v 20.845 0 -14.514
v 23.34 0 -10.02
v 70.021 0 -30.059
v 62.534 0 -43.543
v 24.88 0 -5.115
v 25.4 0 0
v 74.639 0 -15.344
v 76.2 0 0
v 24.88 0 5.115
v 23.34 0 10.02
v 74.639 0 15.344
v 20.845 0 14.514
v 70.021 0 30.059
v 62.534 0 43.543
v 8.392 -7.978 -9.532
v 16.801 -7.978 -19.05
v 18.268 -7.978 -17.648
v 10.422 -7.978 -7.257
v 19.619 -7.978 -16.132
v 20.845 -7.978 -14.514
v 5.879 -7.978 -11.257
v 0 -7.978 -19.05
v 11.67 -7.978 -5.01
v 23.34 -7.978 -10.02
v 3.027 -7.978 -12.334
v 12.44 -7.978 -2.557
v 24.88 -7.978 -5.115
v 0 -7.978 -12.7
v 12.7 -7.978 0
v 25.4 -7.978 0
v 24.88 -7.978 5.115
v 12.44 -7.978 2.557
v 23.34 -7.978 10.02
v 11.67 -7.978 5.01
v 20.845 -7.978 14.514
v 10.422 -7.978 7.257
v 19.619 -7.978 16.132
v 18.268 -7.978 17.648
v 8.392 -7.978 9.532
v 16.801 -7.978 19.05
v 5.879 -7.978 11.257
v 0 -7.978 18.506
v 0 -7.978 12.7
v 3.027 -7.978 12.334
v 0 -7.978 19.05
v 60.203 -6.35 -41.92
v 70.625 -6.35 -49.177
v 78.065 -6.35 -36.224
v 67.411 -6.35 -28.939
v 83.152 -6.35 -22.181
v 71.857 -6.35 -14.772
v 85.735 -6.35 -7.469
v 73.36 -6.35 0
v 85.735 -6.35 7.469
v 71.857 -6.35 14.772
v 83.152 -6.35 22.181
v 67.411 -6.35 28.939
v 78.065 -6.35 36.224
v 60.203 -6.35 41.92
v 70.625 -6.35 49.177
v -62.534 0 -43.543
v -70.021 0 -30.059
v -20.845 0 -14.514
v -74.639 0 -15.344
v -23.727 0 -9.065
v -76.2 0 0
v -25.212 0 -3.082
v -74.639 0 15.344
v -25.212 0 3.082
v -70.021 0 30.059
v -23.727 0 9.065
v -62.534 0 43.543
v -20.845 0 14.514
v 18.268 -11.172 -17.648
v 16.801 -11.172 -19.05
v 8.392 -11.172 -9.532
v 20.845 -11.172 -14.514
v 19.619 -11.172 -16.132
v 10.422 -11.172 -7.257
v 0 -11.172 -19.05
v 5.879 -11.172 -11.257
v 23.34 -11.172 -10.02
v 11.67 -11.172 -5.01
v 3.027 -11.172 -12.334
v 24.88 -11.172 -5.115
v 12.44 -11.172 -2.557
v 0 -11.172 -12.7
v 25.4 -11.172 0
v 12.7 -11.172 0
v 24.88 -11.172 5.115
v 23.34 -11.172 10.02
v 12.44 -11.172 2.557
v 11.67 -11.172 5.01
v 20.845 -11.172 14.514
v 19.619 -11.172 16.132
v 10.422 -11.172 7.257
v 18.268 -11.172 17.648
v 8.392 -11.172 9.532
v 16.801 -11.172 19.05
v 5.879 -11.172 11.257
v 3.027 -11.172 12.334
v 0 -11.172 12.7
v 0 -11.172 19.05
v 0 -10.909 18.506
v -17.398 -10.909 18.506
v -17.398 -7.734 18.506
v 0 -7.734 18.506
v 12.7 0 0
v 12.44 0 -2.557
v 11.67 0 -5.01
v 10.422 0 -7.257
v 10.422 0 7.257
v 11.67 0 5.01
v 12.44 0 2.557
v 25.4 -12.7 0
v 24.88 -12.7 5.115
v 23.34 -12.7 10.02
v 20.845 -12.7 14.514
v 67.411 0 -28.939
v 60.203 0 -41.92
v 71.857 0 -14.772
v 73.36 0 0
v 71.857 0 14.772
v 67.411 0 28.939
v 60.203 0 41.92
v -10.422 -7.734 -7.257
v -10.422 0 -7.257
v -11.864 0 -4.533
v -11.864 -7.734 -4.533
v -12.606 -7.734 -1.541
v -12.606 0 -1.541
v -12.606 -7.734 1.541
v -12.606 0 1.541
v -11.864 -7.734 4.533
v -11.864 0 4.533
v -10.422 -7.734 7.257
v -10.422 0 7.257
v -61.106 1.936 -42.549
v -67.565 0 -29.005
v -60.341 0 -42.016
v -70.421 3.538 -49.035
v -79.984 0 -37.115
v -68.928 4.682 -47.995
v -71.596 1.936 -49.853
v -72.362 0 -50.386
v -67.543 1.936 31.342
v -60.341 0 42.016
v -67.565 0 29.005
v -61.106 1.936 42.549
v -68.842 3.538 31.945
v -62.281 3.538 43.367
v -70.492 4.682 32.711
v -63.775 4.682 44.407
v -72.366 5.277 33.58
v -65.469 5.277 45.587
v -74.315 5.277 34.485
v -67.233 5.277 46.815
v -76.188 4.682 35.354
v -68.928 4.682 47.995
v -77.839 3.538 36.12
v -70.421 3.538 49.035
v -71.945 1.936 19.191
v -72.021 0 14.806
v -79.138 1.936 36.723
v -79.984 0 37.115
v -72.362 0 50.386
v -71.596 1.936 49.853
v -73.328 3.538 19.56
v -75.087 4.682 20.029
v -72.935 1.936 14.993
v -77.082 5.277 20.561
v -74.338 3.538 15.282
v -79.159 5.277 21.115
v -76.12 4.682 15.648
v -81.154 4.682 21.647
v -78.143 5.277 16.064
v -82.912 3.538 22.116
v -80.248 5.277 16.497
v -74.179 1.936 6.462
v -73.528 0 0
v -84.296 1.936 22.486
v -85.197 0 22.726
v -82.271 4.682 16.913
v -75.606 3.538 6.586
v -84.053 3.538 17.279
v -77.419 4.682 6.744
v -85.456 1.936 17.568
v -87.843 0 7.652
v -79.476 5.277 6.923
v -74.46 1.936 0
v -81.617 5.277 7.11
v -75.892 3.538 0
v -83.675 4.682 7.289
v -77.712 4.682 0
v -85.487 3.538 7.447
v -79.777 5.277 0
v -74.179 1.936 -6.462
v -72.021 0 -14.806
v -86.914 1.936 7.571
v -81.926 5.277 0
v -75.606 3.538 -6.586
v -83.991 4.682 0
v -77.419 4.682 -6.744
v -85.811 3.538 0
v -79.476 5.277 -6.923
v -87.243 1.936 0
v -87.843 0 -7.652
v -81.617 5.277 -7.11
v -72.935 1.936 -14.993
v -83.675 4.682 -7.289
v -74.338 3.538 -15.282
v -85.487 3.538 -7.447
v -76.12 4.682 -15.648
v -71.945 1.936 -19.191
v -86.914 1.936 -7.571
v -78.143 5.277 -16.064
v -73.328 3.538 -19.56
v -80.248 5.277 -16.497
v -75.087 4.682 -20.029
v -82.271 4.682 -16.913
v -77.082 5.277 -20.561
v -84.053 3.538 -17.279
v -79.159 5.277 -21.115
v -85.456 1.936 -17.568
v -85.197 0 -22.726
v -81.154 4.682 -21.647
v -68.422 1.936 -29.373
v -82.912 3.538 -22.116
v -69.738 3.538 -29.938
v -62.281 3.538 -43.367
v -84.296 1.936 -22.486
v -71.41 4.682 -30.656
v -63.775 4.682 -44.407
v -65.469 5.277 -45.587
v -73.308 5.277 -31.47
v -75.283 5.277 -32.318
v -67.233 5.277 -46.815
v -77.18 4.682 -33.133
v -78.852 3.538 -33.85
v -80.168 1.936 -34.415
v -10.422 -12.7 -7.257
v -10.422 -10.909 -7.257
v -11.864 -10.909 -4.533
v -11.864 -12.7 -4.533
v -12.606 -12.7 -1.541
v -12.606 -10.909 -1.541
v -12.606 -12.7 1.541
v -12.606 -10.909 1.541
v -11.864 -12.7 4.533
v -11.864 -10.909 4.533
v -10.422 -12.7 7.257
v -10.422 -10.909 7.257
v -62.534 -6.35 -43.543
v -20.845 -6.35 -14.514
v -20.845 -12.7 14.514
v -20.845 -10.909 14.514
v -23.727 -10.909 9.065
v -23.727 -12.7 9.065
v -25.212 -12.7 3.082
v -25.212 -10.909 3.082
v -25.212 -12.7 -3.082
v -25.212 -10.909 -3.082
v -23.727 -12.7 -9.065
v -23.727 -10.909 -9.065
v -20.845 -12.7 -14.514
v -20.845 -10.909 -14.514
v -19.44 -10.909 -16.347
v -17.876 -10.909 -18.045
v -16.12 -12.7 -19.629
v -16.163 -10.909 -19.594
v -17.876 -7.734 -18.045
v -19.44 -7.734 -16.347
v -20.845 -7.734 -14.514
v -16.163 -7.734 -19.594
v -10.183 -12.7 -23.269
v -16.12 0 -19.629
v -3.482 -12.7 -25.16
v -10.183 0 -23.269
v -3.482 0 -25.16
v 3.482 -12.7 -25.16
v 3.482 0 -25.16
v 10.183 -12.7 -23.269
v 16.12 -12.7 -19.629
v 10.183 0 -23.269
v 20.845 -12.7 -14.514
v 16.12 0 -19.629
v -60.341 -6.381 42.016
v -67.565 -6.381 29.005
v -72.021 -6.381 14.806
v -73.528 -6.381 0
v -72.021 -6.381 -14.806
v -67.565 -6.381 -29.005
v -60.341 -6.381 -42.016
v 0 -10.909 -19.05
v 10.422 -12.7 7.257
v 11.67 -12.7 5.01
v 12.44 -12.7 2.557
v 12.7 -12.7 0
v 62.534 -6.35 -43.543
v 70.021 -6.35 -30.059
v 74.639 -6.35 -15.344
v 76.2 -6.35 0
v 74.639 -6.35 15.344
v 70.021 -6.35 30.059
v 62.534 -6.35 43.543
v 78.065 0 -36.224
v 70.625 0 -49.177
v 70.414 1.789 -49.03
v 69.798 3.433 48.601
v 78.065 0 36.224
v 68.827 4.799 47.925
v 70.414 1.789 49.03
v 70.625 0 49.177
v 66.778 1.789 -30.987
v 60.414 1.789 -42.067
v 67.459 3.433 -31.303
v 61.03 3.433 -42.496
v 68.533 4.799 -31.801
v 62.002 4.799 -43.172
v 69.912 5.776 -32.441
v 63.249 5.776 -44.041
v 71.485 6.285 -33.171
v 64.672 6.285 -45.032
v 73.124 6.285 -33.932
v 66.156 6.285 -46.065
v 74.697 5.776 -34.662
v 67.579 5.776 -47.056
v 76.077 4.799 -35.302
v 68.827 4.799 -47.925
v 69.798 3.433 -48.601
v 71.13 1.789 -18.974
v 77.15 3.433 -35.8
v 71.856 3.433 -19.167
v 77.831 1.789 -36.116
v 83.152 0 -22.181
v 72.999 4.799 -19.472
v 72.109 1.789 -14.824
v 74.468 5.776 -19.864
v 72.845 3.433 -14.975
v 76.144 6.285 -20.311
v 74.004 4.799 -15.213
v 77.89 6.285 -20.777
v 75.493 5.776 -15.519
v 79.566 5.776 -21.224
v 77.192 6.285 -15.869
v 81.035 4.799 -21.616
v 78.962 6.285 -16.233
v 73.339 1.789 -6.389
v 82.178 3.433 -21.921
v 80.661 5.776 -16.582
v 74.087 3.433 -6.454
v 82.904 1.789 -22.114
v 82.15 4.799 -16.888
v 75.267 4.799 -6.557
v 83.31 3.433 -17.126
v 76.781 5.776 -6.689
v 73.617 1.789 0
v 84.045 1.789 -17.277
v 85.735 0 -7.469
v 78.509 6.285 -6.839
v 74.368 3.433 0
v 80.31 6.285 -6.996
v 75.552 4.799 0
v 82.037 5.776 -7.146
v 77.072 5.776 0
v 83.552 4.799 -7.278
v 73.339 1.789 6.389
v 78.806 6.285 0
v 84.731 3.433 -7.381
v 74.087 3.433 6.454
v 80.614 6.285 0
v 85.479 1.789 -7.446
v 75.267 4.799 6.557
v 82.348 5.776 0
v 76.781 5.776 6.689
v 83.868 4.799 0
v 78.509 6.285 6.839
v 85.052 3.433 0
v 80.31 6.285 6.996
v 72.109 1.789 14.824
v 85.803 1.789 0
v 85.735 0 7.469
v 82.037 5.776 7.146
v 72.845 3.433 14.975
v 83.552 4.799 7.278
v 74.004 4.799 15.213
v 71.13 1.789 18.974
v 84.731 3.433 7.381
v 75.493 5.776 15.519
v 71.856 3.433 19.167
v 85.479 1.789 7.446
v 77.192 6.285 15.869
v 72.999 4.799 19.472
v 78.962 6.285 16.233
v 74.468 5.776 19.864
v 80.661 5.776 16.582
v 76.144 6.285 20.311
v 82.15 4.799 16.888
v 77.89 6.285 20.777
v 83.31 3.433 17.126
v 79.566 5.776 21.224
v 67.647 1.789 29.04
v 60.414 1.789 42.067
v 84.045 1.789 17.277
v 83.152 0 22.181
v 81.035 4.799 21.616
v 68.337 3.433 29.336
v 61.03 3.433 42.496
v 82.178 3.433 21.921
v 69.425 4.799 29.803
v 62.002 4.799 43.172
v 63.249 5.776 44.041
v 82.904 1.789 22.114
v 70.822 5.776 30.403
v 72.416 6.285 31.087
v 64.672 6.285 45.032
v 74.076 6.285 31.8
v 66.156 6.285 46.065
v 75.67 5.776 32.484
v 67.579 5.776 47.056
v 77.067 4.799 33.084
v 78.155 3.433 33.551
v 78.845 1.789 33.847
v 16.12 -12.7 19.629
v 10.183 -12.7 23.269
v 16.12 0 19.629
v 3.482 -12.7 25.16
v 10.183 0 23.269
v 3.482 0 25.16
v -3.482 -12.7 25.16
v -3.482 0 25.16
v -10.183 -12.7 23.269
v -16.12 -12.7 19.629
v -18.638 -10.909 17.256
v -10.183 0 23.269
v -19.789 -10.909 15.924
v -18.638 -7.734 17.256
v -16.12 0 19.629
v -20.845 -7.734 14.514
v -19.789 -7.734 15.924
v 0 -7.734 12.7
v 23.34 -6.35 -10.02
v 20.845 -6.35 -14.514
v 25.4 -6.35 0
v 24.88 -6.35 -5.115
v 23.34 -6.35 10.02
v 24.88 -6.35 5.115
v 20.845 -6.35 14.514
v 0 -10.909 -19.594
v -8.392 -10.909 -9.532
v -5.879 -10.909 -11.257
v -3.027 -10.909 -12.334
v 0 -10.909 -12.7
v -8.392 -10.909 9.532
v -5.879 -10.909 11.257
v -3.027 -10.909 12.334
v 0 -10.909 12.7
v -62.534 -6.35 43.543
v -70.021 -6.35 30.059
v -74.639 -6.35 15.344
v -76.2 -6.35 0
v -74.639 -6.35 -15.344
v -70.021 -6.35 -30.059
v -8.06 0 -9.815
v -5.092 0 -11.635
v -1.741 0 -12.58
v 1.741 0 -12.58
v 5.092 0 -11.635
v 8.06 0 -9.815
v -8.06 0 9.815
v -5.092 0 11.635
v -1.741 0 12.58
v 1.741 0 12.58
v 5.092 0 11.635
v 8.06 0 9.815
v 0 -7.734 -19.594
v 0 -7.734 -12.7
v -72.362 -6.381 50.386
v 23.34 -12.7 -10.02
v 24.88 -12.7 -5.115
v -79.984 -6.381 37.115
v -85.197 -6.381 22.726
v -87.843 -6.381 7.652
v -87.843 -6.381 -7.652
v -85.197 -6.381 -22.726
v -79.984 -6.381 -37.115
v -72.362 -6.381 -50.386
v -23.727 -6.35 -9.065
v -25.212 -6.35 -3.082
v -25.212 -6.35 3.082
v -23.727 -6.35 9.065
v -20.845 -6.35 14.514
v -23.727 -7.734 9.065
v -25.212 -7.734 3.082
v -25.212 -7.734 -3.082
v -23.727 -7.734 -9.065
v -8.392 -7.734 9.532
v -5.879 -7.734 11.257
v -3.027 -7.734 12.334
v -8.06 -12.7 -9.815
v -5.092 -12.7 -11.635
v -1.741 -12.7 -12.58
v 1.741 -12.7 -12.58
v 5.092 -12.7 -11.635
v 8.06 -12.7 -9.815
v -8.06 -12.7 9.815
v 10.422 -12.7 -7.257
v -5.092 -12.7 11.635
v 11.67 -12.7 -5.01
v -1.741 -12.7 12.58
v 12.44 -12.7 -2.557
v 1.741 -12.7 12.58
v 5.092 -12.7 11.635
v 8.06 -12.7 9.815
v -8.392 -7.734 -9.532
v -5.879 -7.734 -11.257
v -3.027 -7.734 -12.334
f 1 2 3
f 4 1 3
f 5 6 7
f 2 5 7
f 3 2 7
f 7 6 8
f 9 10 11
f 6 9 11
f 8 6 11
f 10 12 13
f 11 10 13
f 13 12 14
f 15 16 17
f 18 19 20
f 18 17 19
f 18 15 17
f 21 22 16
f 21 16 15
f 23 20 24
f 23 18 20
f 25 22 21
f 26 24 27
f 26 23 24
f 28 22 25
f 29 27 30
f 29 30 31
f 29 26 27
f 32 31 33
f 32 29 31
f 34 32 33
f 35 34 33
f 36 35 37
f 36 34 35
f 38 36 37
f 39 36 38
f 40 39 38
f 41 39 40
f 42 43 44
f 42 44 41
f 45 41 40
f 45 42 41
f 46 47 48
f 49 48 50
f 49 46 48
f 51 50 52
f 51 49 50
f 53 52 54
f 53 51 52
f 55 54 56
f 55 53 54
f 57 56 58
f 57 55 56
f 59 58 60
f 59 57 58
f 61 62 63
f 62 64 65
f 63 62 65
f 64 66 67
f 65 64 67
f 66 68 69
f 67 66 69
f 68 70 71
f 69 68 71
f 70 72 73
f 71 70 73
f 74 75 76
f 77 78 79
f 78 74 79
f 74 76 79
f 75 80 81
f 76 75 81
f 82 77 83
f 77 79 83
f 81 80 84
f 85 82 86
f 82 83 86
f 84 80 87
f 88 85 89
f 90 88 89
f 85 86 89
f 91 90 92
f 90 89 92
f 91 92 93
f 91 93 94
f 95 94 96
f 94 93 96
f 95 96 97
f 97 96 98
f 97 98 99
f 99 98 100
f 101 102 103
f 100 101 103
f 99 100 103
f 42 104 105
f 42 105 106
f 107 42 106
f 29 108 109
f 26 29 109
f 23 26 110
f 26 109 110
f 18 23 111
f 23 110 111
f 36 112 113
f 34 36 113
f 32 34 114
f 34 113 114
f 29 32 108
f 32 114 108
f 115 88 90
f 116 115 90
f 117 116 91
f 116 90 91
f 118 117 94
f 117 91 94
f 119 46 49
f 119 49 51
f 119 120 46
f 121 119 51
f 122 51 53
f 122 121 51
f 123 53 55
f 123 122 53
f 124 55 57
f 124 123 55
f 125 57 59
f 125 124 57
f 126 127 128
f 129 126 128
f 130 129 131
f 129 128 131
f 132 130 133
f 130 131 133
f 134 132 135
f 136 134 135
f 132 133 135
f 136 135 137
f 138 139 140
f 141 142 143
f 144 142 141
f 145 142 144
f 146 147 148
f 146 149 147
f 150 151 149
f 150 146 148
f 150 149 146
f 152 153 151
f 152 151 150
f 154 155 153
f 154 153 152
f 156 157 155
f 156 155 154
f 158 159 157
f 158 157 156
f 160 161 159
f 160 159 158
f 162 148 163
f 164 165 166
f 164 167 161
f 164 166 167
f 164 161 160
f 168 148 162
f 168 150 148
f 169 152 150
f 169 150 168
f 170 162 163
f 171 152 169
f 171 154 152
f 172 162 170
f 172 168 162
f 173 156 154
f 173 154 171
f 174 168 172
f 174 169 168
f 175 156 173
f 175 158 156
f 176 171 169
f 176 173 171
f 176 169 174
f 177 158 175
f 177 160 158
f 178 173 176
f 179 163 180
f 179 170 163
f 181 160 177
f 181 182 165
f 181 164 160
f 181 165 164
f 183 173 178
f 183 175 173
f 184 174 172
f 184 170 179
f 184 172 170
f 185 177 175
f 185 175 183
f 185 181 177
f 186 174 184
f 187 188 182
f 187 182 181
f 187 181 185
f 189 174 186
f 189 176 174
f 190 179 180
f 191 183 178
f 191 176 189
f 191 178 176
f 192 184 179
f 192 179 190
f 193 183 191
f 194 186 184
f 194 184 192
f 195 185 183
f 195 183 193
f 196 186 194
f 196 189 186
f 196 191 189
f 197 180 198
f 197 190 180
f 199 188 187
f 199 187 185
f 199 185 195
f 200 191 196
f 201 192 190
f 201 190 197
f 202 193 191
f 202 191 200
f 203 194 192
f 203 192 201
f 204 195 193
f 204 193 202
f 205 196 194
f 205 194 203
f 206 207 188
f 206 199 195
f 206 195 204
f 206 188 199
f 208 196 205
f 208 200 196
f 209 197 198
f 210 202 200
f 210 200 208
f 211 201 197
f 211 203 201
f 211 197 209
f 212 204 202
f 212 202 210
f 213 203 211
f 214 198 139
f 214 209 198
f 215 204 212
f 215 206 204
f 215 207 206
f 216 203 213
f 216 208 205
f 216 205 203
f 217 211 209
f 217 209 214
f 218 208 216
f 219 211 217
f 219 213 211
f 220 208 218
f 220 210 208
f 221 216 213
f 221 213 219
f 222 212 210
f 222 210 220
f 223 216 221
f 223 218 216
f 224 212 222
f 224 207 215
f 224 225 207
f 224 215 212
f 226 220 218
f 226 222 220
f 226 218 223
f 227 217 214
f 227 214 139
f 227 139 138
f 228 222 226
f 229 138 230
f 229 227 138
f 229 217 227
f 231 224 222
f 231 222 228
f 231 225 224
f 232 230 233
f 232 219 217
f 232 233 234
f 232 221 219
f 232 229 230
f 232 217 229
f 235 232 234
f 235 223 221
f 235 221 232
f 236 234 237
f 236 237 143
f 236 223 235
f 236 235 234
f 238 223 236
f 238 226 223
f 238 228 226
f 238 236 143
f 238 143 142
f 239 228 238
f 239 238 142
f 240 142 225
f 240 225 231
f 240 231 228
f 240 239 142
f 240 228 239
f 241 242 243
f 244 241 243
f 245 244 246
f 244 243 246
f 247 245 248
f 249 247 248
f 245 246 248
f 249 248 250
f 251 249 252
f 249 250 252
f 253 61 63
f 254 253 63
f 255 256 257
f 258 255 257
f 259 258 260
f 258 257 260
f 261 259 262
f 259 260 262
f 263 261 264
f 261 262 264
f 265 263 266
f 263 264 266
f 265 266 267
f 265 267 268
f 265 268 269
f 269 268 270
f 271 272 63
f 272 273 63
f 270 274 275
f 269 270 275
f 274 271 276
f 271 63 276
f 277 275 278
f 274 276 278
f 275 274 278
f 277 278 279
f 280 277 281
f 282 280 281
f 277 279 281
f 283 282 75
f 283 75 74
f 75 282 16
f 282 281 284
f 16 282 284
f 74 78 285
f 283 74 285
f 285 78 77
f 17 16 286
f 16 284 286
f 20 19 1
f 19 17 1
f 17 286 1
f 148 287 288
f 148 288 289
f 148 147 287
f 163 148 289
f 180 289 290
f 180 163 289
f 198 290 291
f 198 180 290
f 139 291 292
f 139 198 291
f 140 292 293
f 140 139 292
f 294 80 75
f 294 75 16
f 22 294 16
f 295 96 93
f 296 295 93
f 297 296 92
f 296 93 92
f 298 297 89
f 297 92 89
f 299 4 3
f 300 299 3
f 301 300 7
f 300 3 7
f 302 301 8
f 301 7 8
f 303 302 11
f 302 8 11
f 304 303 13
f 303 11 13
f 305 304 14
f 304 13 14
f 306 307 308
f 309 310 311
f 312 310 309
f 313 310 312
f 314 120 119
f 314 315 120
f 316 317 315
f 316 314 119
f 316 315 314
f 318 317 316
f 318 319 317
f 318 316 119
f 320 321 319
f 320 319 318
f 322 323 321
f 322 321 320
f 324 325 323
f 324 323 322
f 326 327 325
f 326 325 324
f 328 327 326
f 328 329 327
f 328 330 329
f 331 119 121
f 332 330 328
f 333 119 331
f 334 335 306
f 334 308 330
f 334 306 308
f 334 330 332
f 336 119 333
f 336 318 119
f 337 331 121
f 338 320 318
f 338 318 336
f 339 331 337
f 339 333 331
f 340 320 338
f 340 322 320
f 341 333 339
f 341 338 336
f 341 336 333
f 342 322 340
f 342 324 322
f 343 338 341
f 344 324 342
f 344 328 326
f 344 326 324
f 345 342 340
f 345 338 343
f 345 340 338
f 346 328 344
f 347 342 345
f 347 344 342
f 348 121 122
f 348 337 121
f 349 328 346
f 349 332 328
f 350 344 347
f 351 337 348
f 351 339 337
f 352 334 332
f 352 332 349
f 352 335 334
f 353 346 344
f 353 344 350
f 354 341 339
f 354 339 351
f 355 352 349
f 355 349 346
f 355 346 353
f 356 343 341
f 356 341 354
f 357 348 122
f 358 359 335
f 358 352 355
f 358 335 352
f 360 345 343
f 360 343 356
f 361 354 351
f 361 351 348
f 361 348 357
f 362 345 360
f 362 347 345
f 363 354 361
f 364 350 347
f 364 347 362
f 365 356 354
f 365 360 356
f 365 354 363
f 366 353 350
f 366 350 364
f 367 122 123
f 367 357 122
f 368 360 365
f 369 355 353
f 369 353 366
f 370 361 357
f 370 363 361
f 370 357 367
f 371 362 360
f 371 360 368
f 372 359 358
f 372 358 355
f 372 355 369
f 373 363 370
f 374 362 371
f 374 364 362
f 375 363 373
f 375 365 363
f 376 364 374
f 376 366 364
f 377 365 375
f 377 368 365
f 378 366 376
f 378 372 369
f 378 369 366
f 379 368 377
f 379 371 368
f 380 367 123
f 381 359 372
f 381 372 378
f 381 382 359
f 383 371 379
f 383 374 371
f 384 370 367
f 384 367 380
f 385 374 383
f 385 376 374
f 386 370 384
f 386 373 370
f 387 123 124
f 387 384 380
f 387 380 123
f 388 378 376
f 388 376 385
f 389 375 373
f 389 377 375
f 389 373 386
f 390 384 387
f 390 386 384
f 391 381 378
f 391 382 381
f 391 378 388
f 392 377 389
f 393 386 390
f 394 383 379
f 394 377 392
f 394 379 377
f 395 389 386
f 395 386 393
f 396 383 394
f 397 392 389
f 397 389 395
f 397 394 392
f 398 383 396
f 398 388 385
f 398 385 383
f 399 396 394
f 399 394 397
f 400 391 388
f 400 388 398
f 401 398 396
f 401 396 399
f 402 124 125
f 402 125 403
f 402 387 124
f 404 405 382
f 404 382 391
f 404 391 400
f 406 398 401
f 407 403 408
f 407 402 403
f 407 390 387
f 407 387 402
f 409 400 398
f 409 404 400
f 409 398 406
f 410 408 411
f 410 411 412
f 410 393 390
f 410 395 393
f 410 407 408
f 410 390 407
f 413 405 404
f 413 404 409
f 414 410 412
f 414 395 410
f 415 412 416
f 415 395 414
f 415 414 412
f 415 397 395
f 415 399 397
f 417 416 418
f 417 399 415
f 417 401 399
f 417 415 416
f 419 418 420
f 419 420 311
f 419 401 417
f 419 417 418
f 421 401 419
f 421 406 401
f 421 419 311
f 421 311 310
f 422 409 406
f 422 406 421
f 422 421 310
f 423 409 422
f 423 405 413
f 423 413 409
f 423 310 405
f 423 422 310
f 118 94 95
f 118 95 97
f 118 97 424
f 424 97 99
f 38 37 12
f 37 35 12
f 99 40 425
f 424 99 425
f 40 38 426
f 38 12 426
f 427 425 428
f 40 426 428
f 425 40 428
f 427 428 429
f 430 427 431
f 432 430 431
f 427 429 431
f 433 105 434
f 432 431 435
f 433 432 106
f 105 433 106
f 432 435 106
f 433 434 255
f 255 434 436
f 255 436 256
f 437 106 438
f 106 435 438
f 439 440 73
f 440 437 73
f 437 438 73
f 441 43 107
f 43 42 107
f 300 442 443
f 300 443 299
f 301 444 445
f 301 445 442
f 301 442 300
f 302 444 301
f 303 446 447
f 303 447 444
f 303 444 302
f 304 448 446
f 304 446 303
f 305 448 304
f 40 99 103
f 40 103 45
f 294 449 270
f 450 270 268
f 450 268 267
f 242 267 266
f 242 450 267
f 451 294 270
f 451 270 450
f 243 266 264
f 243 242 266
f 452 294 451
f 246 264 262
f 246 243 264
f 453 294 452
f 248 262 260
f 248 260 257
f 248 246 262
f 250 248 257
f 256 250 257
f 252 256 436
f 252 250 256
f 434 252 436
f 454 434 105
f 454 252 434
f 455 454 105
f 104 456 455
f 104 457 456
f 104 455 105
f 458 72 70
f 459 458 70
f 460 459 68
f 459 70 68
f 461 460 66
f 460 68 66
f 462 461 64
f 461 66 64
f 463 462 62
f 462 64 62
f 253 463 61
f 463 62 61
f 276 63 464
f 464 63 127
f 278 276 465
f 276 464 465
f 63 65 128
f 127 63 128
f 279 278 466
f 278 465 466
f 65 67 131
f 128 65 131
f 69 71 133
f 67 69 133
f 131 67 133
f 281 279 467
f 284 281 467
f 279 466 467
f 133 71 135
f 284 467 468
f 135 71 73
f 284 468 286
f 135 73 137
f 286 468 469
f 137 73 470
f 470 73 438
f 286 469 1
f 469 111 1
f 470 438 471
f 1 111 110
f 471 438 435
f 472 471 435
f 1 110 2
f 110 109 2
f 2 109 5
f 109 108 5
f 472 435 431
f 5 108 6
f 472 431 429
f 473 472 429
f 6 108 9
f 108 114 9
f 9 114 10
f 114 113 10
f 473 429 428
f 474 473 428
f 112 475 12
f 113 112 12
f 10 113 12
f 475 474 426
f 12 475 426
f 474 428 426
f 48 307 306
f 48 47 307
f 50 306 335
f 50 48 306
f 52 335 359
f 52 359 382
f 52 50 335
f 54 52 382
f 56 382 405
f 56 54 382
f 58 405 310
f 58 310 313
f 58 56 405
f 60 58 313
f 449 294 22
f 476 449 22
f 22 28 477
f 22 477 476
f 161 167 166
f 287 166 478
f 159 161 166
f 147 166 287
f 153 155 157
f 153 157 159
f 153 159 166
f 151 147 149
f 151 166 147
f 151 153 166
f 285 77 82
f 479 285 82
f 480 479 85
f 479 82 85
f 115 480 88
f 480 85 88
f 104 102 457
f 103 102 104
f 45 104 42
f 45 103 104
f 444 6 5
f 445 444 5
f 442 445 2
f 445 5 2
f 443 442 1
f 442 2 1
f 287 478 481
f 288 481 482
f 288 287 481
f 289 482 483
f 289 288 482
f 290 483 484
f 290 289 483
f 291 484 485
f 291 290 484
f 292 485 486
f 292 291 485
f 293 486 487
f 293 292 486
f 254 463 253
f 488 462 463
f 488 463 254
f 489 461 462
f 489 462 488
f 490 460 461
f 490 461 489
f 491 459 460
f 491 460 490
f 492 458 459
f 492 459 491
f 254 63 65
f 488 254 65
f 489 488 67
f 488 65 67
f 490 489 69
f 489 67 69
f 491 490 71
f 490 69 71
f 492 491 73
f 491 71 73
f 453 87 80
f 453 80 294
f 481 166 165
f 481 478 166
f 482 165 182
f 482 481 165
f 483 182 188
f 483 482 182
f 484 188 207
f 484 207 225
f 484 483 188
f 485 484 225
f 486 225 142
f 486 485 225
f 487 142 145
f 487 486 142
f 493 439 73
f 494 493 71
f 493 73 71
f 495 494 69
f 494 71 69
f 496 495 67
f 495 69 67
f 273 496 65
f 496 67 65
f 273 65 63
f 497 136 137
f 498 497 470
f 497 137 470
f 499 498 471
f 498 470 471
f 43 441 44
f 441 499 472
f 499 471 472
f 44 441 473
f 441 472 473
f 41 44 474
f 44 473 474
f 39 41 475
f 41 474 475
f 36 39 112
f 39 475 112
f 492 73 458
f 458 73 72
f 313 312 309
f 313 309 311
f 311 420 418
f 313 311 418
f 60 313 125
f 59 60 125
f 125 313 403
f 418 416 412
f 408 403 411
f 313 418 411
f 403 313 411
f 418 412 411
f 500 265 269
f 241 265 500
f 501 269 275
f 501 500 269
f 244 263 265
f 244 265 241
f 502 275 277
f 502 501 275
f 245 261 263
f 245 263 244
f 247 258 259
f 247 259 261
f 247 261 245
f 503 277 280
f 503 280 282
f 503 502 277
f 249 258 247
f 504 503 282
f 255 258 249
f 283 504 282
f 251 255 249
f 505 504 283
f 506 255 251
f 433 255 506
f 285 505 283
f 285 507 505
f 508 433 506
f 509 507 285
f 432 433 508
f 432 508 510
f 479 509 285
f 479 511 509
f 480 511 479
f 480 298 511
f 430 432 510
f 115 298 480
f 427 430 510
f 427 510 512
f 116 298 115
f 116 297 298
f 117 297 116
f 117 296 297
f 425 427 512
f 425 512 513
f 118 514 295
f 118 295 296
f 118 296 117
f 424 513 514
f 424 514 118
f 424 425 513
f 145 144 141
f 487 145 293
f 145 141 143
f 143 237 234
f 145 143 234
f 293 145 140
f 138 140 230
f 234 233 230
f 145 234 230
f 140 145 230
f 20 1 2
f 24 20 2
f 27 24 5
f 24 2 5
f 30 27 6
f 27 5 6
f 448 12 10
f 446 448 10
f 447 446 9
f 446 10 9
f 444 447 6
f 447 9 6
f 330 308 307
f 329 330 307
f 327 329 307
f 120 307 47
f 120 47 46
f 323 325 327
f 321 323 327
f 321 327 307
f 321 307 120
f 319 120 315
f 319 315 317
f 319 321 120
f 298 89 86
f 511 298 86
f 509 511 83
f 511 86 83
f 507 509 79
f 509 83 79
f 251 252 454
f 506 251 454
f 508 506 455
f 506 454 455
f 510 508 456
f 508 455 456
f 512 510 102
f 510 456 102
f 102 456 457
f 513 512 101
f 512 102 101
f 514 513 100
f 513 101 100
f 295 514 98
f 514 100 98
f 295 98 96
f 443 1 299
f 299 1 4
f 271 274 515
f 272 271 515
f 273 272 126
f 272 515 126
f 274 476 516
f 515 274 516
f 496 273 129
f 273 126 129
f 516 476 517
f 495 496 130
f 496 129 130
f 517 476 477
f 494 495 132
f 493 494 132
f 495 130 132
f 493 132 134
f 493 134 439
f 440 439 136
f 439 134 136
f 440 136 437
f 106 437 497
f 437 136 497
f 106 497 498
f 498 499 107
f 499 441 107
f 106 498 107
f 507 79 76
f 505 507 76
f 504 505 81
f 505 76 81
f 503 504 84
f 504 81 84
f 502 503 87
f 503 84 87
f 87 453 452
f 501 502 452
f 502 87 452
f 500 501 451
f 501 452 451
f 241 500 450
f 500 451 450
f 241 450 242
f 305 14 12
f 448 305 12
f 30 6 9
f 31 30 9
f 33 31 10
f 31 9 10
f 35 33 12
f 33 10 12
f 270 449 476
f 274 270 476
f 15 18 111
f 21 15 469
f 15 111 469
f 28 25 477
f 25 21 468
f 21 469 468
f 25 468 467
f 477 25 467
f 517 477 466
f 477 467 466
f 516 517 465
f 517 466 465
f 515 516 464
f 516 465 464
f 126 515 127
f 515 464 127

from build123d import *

# Parameters (mm, degrees)
F1_DEPTH  = 6.35
F2_DEPTH  = 12.7
F7_W      = 12.7
F7_H      = 6.35
F9_W      = 3.1940120037
F9_H      = 38.1
F10_DEPTH = 38.1
F11_W     = 3.175
F11_H     = 38.1
F12_DEPTH = 38.1


with BuildPart() as f1:
    # F0 (on Front) → F1 (new body)
    with BuildSketch(Plane.XZ):
        with BuildLine():
            ThreePointArc((-20.8445558889, -14.5142857143), (-25.4, 0), (-20.8445558889, 14.5142857143))
            Line((-20.8445558889, 14.5142857143), (-62.5336676666, 43.5428571429))
            ThreePointArc((-62.5336676666, 43.5428571429), (-76.2, 0), (-62.5336676666, -43.5428571429))
            Line((-62.5336676666, -43.5428571429), (-20.8445558889, -14.5142857143))
        make_face()
    extrude(amount=F1_DEPTH)


with BuildPart() as f1b:
    # F0 (on Front) → F1, piece 2 (new body)
    with BuildSketch(Plane.XZ):
        with BuildLine():
            ThreePointArc((20.8445558889, 14.5142857143), (24.2343941494, 7.6061909134), (25.4, 0))
            ThreePointArc((25.4, 0), (24.2343941494, -7.6061909134), (20.8445558889, -14.5142857143))
            Line((20.8445558889, -14.5142857143), (62.5336676666, -43.5428571429))
            ThreePointArc((62.5336676666, -43.5428571429), (76.2, 0), (62.5336676666, 43.5428571429))
            Line((62.5336676666, 43.5428571429), (20.8445558889, 14.5142857143))
        make_face()
    extrude(amount=F1_DEPTH)


with BuildPart() as f2:
    # F0 (on Front) → F2 (new body)
    with BuildSketch(Plane.XZ):
        with BuildLine():
            Line((10.4222779444, 7.2571428571), (20.8445558889, 14.5142857143))
            ThreePointArc((20.8445558889, 14.5142857143), (0, 25.4), (-20.8445558889, 14.5142857143))
            Line((-20.8445558889, 14.5142857143), (-10.4222779444, 7.2571428571))
            ThreePointArc((-10.4222779444, 7.2571428571), (0, 12.7), (10.4222779444, 7.2571428571))
        make_face()
        with BuildLine():
            Line((-10.4222779444, 7.2571428571), (-20.8445558889, 14.5142857143))
            ThreePointArc((-20.8445558889, 14.5142857143), (-25.4, 0), (-20.8445558889, -14.5142857143))
            Line((-20.8445558889, -14.5142857143), (-10.4222779444, -7.2571428571))
            ThreePointArc((-10.4222779444, -7.2571428571), (-12.7, 0), (-10.4222779444, 7.2571428571))
        make_face()
        with BuildLine():
            ThreePointArc((-20.8445558889, -14.5142857143), (0, -25.4), (20.8445558889, -14.5142857143))
            Line((20.8445558889, -14.5142857143), (10.4222779444, -7.2571428571))
            ThreePointArc((10.4222779444, -7.2571428571), (0, -12.7), (-10.4222779444, -7.2571428571))
            Line((-10.4222779444, -7.2571428571), (-20.8445558889, -14.5142857143))
        make_face()
        with BuildLine():
            ThreePointArc((20.8445558889, -14.5142857143), (24.2343941494, -7.6061909134), (25.4, 0))
            ThreePointArc((25.4, 0), (24.2343941494, 7.6061909134), (20.8445558889, 14.5142857143))
            Line((20.8445558889, 14.5142857143), (10.4222779444, 7.2571428571))
            ThreePointArc((10.4222779444, 7.2571428571), (12.1171970747, 3.8030954567), (12.7, 0))
            ThreePointArc((12.7, 0), (12.1171970747, -3.8030954567), (10.4222779444, -7.2571428571))
            Line((10.4222779444, -7.2571428571), (20.8445558889, -14.5142857143))
        make_face()
    extrude(amount=F2_DEPTH)

    # F9 (on Right) → F10 (cut)
    with BuildSketch(Plane.YZ):
        with Locations((-9.5754200593, 0)):
            Rectangle(F9_W, F9_H)
    extrude(amount=F10_DEPTH, mode=Mode.SUBTRACT)

    # F11 (on Right) → F12 (cut)
    with BuildSketch(Plane.YZ):
        with Locations((-9.3214936979, -0.5436593175)):
            Rectangle(F11_W, F11_H)
    extrude(amount=-F12_DEPTH, mode=Mode.SUBTRACT)


with BuildPart() as f5:
    # F5: sweep along a path in F0
    with BuildLine(Plane.XZ) as f5_path:
        ThreePointArc((-62.5336676666, 43.5428571429), (-76.2, 0), (-62.5336676666, -43.5428571429))
    # F4 (on 3pt) → F5 (sweep)
    with BuildSketch(Plane(origin=(0, 0, 0), x_dir=(0.8206518066, 0, -0.5714285714), z_dir=(0.5714285714, 0, 0.8206518066))):
        with BuildLine():
            Line((-88.1760641932, -6.3813449815), (-73.5275670886, -6.3813449815))
            Line((-73.5275670886, -6.3813449815), (-73.5275670886, 0))
            ThreePointArc((-73.5275670886, 0), (-80.8518156409, 5.351971968), (-88.1760641932, 0))
            Line((-88.1760641932, 0), (-88.1760641932, -6.3813449815))
        make_face()
    sweep(path=f5_path.line)


with BuildPart() as f8:
    # F8: sweep along a path in F8_path
    with BuildLine(Plane(origin=(62.5336676666, -6.35, -43.5428571429), x_dir=(0, 0, -1), z_dir=(0, 1, 0))) as f8_path:
        ThreePointArc((0, 0), (-43.5428571429, -13.6663323334), (-87.0857142857, 0))
    # F7 (on 3pt) → F8 (sweep)
    with BuildSketch(Plane(origin=(0, 0, 0), x_dir=(0.8206518066, 0, 0.5714285714), z_dir=(0.5714285714, 0, -0.8206518066))):
        with Locations((79.7099364758, 3.175)):
            Rectangle(F7_W, F7_H)
        with BuildLine():
            ThreePointArc((73.3599364758, 0), (79.7099364758, -6.35), (86.0599364758, 0))
            Line((86.0599364758, 0), (73.3599364758, 0))
        make_face()
    sweep(path=f8_path.line)


solid = Compound([f1.part, f1b.part, f2.part, f5.part, f8.part])
